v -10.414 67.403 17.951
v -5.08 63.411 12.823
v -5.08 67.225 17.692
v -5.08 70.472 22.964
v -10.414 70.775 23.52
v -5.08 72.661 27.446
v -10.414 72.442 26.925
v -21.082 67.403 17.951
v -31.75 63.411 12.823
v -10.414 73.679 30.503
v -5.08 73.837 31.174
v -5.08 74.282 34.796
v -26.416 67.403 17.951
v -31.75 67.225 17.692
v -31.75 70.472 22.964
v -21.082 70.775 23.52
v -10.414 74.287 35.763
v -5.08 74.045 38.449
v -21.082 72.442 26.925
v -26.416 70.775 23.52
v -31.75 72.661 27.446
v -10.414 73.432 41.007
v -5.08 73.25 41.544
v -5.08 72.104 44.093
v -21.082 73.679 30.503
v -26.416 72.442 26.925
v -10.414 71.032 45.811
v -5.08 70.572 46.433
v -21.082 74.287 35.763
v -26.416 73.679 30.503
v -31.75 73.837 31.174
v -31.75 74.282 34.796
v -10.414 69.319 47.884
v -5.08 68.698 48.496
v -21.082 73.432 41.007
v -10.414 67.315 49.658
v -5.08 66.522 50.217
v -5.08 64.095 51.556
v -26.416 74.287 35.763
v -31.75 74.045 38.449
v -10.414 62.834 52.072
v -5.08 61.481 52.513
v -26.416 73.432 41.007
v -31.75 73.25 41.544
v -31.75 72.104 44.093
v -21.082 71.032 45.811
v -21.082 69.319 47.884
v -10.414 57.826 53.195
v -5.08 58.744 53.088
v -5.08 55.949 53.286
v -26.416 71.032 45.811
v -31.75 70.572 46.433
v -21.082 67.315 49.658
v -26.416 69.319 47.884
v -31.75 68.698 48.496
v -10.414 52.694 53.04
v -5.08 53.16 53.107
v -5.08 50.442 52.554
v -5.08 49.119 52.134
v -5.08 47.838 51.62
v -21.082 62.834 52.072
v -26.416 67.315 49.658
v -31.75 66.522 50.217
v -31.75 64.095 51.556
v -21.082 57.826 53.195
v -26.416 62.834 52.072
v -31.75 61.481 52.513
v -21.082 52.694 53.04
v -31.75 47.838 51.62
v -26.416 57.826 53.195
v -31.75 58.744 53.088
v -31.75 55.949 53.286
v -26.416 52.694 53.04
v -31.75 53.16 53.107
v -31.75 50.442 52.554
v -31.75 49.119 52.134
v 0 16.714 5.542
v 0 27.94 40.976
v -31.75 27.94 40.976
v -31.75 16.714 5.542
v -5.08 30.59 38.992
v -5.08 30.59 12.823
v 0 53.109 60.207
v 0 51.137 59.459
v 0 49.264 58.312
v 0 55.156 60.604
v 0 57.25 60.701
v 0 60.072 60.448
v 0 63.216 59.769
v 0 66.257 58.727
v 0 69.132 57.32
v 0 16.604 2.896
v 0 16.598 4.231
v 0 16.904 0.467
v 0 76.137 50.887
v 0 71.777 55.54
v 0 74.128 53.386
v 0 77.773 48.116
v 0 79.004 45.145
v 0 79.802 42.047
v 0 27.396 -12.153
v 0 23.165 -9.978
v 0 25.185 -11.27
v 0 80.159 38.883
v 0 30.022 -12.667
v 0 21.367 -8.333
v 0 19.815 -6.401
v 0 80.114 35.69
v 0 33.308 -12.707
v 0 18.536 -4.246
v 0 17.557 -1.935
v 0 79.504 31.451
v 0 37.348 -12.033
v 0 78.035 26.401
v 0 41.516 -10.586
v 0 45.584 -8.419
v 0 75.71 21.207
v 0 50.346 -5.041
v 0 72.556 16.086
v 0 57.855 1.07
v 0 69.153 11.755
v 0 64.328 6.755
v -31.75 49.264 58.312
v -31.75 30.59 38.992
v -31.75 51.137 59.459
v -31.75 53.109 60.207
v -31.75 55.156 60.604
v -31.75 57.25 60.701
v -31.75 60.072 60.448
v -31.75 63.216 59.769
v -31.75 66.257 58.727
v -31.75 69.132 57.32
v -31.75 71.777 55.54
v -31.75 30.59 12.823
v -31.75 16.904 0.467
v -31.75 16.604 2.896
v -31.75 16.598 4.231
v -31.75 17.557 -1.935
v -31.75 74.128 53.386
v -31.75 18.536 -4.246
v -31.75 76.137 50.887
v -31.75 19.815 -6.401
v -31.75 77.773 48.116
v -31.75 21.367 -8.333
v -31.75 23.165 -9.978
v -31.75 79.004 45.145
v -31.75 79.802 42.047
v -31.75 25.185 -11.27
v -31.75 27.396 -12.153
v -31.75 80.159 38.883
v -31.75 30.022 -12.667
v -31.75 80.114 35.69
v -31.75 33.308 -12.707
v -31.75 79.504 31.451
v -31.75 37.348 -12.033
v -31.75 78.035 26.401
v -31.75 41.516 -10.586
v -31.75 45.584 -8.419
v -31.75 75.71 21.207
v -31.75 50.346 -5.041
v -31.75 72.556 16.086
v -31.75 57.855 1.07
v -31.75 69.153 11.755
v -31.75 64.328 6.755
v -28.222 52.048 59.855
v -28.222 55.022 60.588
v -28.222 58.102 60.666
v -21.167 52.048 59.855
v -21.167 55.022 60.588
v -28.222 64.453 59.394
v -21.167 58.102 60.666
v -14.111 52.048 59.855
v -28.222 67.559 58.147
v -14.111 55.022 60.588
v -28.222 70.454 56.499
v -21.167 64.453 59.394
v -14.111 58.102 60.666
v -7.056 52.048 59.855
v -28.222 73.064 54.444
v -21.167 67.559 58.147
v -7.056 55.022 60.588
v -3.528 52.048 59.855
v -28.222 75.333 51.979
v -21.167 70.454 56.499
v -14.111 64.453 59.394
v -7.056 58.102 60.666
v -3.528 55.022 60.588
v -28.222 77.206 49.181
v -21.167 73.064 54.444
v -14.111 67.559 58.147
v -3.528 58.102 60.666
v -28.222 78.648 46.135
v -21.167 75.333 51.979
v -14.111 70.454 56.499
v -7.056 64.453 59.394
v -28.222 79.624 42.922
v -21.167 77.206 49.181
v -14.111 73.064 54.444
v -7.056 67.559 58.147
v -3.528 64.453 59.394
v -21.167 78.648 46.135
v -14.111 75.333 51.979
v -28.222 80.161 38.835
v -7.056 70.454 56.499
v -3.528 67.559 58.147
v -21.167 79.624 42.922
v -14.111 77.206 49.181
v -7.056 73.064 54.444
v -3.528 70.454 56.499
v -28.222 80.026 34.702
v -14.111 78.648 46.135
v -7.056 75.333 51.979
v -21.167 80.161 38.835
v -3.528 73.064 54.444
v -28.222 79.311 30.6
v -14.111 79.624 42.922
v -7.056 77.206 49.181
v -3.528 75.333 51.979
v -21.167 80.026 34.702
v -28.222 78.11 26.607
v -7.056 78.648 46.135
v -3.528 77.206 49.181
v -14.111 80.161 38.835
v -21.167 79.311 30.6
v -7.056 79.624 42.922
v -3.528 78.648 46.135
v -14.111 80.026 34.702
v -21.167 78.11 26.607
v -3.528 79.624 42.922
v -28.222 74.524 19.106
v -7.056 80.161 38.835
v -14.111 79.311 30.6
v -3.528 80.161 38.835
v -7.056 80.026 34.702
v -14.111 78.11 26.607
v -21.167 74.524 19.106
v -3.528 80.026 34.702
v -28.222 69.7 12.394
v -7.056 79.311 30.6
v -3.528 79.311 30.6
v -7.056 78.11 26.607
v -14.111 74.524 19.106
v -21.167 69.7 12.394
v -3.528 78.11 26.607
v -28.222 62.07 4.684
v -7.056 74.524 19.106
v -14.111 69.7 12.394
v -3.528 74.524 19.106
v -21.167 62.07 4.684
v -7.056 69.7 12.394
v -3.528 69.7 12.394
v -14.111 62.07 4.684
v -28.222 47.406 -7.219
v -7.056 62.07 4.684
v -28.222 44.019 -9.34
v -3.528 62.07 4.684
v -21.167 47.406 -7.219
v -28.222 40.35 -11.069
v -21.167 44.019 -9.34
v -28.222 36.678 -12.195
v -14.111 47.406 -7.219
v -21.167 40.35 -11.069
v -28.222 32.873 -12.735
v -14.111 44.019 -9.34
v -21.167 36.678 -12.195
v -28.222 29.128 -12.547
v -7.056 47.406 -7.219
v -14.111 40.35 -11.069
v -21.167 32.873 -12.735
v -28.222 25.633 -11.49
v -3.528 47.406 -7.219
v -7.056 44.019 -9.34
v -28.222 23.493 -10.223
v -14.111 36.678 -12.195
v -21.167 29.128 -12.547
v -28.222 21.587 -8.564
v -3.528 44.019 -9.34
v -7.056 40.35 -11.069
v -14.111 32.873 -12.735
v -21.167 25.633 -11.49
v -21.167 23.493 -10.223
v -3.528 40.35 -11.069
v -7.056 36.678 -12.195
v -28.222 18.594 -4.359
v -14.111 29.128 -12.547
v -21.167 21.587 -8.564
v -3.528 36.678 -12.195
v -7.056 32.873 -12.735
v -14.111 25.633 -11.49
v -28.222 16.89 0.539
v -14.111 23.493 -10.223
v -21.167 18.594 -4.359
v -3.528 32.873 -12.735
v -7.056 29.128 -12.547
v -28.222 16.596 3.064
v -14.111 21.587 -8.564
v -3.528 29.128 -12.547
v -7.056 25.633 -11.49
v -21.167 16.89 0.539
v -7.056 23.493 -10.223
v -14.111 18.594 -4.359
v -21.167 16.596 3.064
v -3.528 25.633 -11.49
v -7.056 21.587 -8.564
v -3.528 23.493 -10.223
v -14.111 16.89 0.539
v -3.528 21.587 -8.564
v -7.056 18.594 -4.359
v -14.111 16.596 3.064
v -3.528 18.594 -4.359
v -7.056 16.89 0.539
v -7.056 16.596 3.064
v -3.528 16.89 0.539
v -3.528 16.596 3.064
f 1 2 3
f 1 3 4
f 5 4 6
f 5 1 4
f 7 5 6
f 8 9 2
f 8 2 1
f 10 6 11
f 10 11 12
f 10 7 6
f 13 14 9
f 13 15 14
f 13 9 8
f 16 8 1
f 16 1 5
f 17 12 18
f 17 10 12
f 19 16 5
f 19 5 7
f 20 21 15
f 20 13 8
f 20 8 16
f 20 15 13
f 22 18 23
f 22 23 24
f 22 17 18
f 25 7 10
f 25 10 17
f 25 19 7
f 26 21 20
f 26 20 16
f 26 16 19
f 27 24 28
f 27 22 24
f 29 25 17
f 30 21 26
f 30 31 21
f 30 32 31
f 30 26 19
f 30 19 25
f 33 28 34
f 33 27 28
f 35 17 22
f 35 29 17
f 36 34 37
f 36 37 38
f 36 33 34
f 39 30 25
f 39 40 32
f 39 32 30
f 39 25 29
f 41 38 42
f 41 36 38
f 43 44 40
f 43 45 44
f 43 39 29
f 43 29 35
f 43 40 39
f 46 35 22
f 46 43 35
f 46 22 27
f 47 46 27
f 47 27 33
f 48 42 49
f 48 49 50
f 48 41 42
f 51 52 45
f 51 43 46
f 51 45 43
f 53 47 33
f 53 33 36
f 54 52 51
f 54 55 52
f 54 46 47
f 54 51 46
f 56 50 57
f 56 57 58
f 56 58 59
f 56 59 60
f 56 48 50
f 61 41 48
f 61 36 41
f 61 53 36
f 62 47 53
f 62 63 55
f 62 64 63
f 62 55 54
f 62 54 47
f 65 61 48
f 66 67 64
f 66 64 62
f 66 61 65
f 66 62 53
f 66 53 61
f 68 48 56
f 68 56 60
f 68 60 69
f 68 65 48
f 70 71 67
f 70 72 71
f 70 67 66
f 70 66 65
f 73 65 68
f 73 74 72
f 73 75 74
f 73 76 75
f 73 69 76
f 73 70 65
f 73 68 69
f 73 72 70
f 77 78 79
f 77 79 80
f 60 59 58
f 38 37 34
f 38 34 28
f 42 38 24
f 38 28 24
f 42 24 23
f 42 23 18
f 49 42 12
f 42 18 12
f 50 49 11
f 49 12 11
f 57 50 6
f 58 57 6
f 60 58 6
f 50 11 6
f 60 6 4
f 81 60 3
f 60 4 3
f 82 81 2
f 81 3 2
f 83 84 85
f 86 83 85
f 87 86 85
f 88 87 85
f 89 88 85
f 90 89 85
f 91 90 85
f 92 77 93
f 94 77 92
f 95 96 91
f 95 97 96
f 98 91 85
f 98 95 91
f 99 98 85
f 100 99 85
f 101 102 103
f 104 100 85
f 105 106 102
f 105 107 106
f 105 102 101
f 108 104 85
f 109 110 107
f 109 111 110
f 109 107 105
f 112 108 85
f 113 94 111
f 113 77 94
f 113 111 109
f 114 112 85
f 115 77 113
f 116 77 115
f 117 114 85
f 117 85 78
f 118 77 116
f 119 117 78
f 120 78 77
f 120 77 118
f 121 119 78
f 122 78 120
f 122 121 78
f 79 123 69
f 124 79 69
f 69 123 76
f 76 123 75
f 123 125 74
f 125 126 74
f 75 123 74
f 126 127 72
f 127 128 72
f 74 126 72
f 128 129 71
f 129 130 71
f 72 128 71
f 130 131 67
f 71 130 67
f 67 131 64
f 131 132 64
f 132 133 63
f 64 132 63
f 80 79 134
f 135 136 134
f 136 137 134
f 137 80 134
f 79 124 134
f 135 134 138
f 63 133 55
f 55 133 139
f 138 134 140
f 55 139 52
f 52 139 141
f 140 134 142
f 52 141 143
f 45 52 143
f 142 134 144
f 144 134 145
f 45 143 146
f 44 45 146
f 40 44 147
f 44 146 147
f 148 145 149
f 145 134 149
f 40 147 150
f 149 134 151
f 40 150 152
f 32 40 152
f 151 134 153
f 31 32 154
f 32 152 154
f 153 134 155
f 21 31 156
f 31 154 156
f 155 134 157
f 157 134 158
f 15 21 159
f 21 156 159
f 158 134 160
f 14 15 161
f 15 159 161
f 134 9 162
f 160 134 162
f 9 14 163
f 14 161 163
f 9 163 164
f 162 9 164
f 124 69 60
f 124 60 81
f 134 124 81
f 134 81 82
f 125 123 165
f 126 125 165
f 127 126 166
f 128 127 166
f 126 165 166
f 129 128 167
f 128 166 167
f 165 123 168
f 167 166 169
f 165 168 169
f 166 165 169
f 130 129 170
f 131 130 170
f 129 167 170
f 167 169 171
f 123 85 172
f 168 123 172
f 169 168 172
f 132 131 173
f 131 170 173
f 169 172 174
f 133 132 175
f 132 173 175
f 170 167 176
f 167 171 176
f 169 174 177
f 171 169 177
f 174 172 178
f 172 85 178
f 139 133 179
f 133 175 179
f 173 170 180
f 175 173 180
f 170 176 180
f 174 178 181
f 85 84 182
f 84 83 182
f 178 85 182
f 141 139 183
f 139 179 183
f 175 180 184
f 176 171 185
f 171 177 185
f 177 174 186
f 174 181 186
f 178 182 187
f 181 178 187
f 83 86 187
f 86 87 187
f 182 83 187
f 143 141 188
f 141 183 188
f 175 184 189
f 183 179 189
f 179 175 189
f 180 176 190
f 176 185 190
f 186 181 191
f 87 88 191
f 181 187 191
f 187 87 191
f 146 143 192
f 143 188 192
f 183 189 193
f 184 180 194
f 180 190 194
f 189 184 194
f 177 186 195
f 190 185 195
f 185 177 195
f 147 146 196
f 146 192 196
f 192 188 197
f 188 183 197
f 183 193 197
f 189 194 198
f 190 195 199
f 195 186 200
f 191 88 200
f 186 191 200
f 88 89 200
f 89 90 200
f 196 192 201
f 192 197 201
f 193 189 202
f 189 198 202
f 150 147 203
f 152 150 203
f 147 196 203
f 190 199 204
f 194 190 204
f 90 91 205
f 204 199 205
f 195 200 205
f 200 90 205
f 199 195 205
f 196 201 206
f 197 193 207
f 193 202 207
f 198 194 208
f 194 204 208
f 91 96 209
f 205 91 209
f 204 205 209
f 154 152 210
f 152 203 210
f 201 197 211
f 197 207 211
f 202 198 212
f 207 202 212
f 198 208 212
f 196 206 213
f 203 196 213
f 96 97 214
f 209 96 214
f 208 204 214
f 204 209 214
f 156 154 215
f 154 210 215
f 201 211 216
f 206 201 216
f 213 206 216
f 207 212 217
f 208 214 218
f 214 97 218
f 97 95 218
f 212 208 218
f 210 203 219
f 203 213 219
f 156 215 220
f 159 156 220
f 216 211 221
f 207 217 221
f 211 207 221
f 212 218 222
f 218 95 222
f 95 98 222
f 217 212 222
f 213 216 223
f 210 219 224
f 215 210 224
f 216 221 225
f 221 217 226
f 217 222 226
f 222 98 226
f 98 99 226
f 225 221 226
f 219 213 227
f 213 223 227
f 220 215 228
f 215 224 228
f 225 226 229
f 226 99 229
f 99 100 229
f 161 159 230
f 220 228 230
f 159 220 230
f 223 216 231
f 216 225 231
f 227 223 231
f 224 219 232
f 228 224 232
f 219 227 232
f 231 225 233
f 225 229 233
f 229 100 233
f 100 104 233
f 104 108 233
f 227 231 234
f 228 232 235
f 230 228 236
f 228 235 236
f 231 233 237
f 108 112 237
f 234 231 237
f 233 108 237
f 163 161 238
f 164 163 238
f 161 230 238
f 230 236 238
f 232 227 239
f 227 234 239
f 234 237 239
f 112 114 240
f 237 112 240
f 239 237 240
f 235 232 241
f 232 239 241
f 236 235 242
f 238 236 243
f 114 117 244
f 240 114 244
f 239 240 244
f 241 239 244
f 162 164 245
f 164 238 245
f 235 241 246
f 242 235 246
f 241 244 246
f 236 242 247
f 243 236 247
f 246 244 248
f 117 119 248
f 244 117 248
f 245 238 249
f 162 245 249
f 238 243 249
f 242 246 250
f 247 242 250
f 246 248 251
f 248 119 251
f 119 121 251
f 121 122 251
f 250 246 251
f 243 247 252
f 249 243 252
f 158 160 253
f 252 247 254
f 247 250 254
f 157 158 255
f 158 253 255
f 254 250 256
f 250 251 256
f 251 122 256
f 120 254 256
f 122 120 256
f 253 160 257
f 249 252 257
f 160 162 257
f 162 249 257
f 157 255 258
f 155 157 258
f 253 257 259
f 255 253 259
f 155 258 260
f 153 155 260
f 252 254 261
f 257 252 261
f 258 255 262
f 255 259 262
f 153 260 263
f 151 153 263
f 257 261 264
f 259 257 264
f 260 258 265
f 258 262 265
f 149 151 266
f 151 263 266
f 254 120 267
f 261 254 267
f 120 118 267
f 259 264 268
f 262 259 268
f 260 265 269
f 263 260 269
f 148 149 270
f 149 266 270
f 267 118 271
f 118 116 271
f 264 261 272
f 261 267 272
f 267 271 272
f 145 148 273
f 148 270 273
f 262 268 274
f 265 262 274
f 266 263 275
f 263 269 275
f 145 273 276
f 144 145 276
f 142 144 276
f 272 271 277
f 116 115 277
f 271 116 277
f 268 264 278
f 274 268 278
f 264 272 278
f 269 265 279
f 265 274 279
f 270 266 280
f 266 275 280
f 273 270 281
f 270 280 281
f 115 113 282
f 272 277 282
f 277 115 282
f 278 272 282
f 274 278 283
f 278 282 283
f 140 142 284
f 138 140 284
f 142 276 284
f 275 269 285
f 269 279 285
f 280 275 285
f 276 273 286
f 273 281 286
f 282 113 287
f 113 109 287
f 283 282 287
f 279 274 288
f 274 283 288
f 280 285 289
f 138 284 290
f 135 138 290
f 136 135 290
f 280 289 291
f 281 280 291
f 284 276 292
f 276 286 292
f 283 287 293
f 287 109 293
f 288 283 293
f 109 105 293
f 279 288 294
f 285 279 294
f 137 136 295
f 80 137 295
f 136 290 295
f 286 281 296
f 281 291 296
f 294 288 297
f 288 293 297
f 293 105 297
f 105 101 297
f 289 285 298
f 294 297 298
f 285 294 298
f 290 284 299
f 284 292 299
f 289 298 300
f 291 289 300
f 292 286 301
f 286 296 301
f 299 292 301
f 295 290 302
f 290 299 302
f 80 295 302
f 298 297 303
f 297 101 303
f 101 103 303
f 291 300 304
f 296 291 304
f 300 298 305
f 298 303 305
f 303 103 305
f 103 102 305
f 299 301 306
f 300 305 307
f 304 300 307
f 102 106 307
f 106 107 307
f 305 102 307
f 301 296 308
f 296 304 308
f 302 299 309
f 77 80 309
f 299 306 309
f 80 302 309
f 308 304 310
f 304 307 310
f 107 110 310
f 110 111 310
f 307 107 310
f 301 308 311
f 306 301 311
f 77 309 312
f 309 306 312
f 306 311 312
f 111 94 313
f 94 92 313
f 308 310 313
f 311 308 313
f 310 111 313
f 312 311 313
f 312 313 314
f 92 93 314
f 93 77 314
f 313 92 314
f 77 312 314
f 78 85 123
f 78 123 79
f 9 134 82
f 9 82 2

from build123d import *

# Parameters (mm, degrees)
BOSS_EXTRUDE3_DEPTH = 31.75
CUT_EXTRUDE1_DEPTH  = 26.67


with BuildPart() as part:
    # Sketch3 → Boss-Extrude3 (new body)
    with BuildSketch(Plane(origin=(0, 0, 0), x_dir=(0, 0, -1), z_dir=(1, 0, 0))):
        with BuildLine():
            Line((-40.97610675, 27.94), (-5.541970322, 16.71398183))
            add(Edge.make_bspline(
                [(-58.312477556, 49.264351944), (-60.979470459, 52.81331915), (-61.164357979, 61.6455386), (-55.537732377, 74.034432649), (-42.16369512, 81.50596405), (-26.062607722, 79.151326189), (-10.351869297, 69.352421272), (1.104415904, 55.168195736), (12.200560018, 41.689568578), (14.414652135, 22.449660006), (0.938744116, 15.82577004), (-5.541970322, 16.71398183)],
                knots=[0, 0, 0, 0, 0.085903654, 0.177468497, 0.269424522, 0.38307045, 0.497612493, 0.648285366, 0.759107455, 0.86122633, 1, 1, 1, 1], degree=3))
            Line((-58.312477556, 49.264351944), (-40.97610675, 27.94))
        make_face()
    extrude(amount=-BOSS_EXTRUDE3_DEPTH)

    # Sketch4 → Cut-Extrude1 (cut)
    with BuildSketch(Plane.ZY.offset(31.75)):
        with BuildLine():
            Line((51.619537388, 47.838415212), (38.991660301, 30.589789753))
            Line((38.991660301, 30.589789753), (12.82348056, 30.589789753))
            Line((12.82348056, 30.589789753), (12.82348056, 63.410804486))
            add(Edge.make_bspline(
                [(12.82348056, 63.410804486), (16.075524743, 66.305691468), (21.766381335, 70.098645112), (31.247490953, 74.563292025), (41.354678146, 74.490665245), (53.427066999, 66.018283329), (54.350384677, 53.94821484), (51.619537388, 47.838415212)],
                knots=[0.403518168, 0.403518168, 0.403518168, 0.403518168, 0.529247637, 0.602050827, 0.703207049, 0.805208076, 1, 1, 1, 1], degree=3))
        make_face()
    extrude(amount=-CUT_EXTRUDE1_DEPTH, mode=Mode.SUBTRACT)


solid = part.part
